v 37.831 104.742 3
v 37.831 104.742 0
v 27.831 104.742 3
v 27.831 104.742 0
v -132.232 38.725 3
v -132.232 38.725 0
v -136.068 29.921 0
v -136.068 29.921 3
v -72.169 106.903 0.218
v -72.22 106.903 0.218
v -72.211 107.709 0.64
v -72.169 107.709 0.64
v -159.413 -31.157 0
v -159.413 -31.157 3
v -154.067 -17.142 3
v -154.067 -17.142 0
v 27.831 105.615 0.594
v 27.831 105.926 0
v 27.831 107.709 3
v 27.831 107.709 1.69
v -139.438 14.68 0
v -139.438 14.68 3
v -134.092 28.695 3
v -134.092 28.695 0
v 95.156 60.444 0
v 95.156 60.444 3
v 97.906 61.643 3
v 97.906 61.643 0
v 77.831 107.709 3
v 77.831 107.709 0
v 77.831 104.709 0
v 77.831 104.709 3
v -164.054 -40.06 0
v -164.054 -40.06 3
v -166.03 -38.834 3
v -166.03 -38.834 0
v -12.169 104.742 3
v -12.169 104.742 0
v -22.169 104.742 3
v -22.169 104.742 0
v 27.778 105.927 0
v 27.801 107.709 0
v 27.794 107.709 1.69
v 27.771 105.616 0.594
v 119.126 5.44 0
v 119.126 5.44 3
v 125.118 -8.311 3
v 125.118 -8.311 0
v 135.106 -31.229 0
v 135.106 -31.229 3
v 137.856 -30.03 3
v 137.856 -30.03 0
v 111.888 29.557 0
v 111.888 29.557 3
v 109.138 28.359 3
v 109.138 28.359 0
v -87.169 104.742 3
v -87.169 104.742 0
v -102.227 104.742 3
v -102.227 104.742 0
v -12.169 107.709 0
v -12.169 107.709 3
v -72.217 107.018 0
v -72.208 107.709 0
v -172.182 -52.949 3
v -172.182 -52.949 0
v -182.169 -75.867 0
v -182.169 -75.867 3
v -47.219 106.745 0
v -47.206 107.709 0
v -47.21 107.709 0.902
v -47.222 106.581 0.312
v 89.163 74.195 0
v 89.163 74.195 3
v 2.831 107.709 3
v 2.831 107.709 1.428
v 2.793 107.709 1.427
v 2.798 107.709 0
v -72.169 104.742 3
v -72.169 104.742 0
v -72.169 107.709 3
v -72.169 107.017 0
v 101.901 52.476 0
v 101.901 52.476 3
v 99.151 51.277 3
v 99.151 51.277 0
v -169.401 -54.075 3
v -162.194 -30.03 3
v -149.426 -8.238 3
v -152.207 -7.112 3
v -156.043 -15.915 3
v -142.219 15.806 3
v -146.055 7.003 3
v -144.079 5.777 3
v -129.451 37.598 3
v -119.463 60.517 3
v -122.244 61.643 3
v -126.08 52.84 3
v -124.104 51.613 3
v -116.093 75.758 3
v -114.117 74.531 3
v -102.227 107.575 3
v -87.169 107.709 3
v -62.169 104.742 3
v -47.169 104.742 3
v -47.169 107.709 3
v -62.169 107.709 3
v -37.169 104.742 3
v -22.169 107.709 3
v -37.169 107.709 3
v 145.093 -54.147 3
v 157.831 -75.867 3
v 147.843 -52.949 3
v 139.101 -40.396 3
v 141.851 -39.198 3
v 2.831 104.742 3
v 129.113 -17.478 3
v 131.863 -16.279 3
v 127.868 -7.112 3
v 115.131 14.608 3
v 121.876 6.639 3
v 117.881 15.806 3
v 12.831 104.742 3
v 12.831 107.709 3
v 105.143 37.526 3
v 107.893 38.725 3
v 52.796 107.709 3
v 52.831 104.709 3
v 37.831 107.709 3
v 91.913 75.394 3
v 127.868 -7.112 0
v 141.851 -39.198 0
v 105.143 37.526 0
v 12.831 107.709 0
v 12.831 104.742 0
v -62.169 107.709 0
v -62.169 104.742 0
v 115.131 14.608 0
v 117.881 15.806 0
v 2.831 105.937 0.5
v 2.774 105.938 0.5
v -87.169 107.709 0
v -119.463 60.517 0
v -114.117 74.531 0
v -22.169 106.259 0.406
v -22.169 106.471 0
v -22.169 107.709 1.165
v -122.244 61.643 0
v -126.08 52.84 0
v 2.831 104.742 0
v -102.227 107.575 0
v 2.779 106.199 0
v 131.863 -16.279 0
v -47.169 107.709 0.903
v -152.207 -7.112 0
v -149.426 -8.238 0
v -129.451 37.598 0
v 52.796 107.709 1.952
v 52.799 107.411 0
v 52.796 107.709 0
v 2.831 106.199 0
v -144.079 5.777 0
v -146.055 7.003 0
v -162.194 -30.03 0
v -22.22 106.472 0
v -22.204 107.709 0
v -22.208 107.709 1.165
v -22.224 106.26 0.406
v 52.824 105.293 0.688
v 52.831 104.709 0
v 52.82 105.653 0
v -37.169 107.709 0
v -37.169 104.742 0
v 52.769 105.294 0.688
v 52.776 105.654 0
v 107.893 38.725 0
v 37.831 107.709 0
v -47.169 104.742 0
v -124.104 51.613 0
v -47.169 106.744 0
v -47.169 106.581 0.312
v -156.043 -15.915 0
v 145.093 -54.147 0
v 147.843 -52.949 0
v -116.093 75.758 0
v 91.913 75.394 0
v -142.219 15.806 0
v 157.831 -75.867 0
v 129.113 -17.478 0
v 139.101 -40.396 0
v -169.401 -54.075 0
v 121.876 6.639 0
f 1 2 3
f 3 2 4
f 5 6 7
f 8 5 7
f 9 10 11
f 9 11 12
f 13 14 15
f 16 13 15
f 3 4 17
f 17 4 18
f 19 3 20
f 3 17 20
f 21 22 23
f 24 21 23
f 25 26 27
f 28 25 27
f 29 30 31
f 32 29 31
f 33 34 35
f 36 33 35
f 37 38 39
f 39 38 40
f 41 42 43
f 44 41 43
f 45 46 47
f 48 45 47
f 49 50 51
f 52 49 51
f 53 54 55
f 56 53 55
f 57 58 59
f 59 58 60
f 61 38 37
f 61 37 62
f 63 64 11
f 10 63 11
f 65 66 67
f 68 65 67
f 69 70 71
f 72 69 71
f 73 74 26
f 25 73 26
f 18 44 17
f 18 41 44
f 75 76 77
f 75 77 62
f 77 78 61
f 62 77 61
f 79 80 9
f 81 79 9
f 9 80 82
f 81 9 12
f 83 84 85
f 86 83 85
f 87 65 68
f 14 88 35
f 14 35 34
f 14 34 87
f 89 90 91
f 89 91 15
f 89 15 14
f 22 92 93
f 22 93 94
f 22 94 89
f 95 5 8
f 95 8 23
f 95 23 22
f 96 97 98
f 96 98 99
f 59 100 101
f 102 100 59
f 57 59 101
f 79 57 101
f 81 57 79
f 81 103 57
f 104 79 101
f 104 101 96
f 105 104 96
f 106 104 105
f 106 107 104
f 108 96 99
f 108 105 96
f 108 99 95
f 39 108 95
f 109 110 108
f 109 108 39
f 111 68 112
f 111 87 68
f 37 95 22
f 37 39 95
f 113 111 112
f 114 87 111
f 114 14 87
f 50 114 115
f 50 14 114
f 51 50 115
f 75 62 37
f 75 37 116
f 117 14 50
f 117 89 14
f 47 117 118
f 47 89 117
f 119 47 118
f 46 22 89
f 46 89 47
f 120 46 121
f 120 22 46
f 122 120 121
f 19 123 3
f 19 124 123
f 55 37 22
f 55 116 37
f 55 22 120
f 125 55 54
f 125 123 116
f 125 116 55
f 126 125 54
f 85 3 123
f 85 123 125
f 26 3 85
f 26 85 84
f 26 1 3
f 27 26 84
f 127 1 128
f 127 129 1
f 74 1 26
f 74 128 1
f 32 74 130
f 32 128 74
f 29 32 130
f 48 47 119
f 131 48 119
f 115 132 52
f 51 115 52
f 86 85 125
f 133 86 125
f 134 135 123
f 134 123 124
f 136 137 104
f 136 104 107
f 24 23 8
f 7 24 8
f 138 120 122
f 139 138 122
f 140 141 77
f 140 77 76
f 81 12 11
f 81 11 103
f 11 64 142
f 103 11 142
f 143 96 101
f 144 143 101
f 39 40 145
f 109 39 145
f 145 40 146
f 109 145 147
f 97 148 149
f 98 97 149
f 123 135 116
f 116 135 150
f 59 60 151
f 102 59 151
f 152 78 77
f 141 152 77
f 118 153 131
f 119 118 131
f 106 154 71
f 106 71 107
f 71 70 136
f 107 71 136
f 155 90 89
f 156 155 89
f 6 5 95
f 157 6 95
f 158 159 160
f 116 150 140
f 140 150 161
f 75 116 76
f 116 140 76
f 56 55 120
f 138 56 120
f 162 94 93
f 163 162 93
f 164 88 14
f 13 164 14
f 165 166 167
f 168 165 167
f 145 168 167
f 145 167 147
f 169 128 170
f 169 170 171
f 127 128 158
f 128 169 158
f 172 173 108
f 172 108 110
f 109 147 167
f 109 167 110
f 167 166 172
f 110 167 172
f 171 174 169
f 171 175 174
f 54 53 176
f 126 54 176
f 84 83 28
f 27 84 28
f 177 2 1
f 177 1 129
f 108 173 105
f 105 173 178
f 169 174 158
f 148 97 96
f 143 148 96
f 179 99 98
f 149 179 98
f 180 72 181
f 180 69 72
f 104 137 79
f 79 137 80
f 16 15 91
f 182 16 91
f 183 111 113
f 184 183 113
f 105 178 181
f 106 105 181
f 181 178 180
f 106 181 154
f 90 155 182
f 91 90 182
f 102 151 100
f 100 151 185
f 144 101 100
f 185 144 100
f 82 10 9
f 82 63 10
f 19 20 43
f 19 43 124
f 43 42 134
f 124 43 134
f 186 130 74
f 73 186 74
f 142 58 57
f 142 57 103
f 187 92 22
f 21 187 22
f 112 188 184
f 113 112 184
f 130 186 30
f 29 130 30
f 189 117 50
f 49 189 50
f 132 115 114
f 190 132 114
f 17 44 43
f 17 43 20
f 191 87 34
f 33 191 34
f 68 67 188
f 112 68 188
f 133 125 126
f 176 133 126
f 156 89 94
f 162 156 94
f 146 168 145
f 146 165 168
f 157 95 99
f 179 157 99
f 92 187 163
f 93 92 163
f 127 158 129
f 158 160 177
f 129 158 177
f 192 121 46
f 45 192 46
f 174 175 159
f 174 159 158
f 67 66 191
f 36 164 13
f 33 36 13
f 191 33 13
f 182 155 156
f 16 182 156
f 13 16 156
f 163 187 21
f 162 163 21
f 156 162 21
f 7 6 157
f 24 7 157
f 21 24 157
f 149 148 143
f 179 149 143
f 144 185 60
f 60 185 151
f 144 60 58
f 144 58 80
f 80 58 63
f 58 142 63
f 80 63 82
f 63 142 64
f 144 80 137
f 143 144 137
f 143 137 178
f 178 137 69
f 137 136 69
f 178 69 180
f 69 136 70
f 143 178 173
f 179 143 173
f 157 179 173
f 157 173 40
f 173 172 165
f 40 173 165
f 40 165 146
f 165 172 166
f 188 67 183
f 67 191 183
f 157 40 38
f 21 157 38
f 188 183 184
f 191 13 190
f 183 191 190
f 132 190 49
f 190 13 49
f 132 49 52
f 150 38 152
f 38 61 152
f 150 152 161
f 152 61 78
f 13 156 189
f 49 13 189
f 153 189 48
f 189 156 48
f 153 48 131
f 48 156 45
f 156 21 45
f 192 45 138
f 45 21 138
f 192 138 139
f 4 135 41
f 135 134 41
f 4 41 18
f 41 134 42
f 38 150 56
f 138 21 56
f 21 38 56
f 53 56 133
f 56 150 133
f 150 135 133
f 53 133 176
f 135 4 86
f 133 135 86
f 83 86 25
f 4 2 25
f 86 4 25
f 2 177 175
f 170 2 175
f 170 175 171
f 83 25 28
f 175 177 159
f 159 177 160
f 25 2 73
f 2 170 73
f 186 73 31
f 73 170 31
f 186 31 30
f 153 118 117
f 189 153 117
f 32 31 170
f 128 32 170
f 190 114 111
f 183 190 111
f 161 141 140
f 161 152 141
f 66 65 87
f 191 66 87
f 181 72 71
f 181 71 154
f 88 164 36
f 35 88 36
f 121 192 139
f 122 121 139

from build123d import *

# Parameters (mm, degrees)
BOSS_EXTRUDE1_DEPTH = 3
CUT_EXTRUDE2_DEPTH  = 3
LPATTERN2_COUNT     = 6
LPATTERN2_PITCH     = 25
CUT_EXTRUDE3_DEPTH  = 3
LPATTERN3_COUNT     = 6
LPATTERN3_PITCH     = 25
CAVITY4_START       = 94.102573719
CAVITY4_DEPTH       = 3
SKETCH4_W           = 10
SKETCH4_H           = 3
SKETCH4_W_2         = 15.058056796
SKETCH4_H_2         = 3.003228899
CUT_EXTRUDE5_DEPTH  = 10


# Read off the part's stored shape, not the designer's step: Cavity4
with BuildPart() as part:
    # Sketch1 → Boss-Extrude1 (new body)
    with BuildSketch(Plane.XY):
        Polygon((-182.169109633, -75.86705578), (157.830890367, -75.86705578), (77.830890367, 107.708711956), (-102.169109633, 107.708711956), align=None)
    extrude(amount=BOSS_EXTRUDE1_DEPTH)

    # Sketch2 → Cut-Extrude2 (cut)
    with BuildSketch(Plane.XY.offset(3)):
        Polygon((-172.181594028, -52.948732717), (-169.400999714, -54.074918874), (-164.054462817, -40.06012158), (-166.030438991, -38.833695112), align=None)
    cut_extrude2 = extrude(amount=-CUT_EXTRUDE2_DEPTH, mode=Mode.SUBTRACT)

    # LPattern2: Cut-Extrude2 ×6
    with Locations(*[Vector(0.3995006242197252, 0.916732922528721, 0) * (i * LPATTERN2_PITCH) for i in range(1, LPATTERN2_COUNT)]):
        add(cut_extrude2, mode=Mode.SUBTRACT)

    # Sketch3 → Cut-Extrude3 (cut)
    with BuildSketch(Plane.XY.offset(3)):
        Polygon((147.843374761, -52.948732717), (141.850865398, -39.197738879), (139.10066663, -40.396240752), (145.093175994, -54.14723459), align=None)
    cut_extrude3 = extrude(amount=-CUT_EXTRUDE3_DEPTH, mode=Mode.SUBTRACT)

    # LPattern3: Cut-Extrude3 ×6
    with Locations(*[Vector(-0.3995006242197251, 0.9167329225287211, 0) * (i * LPATTERN3_PITCH) for i in range(1, LPATTERN3_COUNT)]):
        add(cut_extrude3, mode=Mode.SUBTRACT)

    # Cavity4 outline → Cavity4 (cut)
    with BuildSketch(Plane(origin=(0, 0, 0), x_dir=(0.9999532933915303, -0.008562000513036364, -0.004483657284732639), z_dir=(0.009664938459823271, 0.8858411925353571, 0.46388788577856205)).offset(CAVITY4_START)):
        Polygon((-103.131187753, 49.679443772), (-88.131836909, 49.53989356), (-88.127862283, 49.967100463), (-88.118252444, 51), (-103.118901627, 51), (-103.12893984, 49.921057402), align=None)
        Polygon((-63.117170469, 51), (-73.117603258, 51), (-73.127213098, 49.967100463), (-73.132486065, 49.400343349), (-63.132918836, 49.307309875), (-63.126780309, 49.967100463), align=None)
        Polygon((-38.116088496, 51), (-48.116521286, 51), (-48.126131125, 49.967100463), (-48.133567992, 49.167759664), (-38.134000762, 49.07472619), (-38.125698335, 49.967100463), align=None)
        Polygon((-13.115006523, 51), (-23.115439311, 51), (-23.125049151, 49.967100463), (-23.134649919, 48.935175979), (-13.135082689, 48.842142504), (-13.124616362, 49.967100463), align=None)
        Polygon((76.879278743, 49.967100463), (76.888888582, 51), (51.887806609, 51), (51.87819677, 49.967100463), (51.862104301, 48.237424923), (76.861022374, 48.004841237), align=None)
        Polygon((11.886075451, 51), (1.885642662, 51), (1.876032823, 49.967100463), (1.864268155, 48.702592293), (11.863835384, 48.609558819), (11.876465612, 49.967100463), align=None)
        Polygon((36.877547586, 49.967100463), (36.887157425, 51), (26.886724635, 51), (26.877114796, 49.967100463), (26.863186228, 48.470008608), (36.862753457, 48.376975134), align=None)
    extrude(amount=CAVITY4_DEPTH, mode=Mode.SUBTRACT)

    # Sketch4 → Cut-Extrude5 (cut)
    with BuildSketch(Plane(origin=(0, 0, 0), x_dir=(-1, 0, 0), z_dir=(0, 0, -1))):
        Polygon((-77.830853836, 107.708711956), (-77.830853836, 104.708711956), (-52.830853836, 104.708711956), (-52.795526537, 107.708711956), align=None)
        with Locations((-32.830890367, 106.241816524)):
            Rectangle(SKETCH4_W, SKETCH4_H)
        with Locations((-7.830890367, 106.241816524)):
            Rectangle(SKETCH4_W, SKETCH4_H)
        with Locations((17.169109633, 106.241816524)):
            Rectangle(SKETCH4_W, SKETCH4_H)
        with Locations((42.169109633, 106.241816524)):
            Rectangle(SKETCH4_W, SKETCH4_H)
        with Locations((67.169109633, 106.241816524)):
            Rectangle(SKETCH4_W, SKETCH4_H)
        with Locations((94.698138031, 106.243430974)):
            Rectangle(SKETCH4_W_2, SKETCH4_H_2)
    extrude(amount=-CUT_EXTRUDE5_DEPTH, mode=Mode.SUBTRACT)


solid = part.part
